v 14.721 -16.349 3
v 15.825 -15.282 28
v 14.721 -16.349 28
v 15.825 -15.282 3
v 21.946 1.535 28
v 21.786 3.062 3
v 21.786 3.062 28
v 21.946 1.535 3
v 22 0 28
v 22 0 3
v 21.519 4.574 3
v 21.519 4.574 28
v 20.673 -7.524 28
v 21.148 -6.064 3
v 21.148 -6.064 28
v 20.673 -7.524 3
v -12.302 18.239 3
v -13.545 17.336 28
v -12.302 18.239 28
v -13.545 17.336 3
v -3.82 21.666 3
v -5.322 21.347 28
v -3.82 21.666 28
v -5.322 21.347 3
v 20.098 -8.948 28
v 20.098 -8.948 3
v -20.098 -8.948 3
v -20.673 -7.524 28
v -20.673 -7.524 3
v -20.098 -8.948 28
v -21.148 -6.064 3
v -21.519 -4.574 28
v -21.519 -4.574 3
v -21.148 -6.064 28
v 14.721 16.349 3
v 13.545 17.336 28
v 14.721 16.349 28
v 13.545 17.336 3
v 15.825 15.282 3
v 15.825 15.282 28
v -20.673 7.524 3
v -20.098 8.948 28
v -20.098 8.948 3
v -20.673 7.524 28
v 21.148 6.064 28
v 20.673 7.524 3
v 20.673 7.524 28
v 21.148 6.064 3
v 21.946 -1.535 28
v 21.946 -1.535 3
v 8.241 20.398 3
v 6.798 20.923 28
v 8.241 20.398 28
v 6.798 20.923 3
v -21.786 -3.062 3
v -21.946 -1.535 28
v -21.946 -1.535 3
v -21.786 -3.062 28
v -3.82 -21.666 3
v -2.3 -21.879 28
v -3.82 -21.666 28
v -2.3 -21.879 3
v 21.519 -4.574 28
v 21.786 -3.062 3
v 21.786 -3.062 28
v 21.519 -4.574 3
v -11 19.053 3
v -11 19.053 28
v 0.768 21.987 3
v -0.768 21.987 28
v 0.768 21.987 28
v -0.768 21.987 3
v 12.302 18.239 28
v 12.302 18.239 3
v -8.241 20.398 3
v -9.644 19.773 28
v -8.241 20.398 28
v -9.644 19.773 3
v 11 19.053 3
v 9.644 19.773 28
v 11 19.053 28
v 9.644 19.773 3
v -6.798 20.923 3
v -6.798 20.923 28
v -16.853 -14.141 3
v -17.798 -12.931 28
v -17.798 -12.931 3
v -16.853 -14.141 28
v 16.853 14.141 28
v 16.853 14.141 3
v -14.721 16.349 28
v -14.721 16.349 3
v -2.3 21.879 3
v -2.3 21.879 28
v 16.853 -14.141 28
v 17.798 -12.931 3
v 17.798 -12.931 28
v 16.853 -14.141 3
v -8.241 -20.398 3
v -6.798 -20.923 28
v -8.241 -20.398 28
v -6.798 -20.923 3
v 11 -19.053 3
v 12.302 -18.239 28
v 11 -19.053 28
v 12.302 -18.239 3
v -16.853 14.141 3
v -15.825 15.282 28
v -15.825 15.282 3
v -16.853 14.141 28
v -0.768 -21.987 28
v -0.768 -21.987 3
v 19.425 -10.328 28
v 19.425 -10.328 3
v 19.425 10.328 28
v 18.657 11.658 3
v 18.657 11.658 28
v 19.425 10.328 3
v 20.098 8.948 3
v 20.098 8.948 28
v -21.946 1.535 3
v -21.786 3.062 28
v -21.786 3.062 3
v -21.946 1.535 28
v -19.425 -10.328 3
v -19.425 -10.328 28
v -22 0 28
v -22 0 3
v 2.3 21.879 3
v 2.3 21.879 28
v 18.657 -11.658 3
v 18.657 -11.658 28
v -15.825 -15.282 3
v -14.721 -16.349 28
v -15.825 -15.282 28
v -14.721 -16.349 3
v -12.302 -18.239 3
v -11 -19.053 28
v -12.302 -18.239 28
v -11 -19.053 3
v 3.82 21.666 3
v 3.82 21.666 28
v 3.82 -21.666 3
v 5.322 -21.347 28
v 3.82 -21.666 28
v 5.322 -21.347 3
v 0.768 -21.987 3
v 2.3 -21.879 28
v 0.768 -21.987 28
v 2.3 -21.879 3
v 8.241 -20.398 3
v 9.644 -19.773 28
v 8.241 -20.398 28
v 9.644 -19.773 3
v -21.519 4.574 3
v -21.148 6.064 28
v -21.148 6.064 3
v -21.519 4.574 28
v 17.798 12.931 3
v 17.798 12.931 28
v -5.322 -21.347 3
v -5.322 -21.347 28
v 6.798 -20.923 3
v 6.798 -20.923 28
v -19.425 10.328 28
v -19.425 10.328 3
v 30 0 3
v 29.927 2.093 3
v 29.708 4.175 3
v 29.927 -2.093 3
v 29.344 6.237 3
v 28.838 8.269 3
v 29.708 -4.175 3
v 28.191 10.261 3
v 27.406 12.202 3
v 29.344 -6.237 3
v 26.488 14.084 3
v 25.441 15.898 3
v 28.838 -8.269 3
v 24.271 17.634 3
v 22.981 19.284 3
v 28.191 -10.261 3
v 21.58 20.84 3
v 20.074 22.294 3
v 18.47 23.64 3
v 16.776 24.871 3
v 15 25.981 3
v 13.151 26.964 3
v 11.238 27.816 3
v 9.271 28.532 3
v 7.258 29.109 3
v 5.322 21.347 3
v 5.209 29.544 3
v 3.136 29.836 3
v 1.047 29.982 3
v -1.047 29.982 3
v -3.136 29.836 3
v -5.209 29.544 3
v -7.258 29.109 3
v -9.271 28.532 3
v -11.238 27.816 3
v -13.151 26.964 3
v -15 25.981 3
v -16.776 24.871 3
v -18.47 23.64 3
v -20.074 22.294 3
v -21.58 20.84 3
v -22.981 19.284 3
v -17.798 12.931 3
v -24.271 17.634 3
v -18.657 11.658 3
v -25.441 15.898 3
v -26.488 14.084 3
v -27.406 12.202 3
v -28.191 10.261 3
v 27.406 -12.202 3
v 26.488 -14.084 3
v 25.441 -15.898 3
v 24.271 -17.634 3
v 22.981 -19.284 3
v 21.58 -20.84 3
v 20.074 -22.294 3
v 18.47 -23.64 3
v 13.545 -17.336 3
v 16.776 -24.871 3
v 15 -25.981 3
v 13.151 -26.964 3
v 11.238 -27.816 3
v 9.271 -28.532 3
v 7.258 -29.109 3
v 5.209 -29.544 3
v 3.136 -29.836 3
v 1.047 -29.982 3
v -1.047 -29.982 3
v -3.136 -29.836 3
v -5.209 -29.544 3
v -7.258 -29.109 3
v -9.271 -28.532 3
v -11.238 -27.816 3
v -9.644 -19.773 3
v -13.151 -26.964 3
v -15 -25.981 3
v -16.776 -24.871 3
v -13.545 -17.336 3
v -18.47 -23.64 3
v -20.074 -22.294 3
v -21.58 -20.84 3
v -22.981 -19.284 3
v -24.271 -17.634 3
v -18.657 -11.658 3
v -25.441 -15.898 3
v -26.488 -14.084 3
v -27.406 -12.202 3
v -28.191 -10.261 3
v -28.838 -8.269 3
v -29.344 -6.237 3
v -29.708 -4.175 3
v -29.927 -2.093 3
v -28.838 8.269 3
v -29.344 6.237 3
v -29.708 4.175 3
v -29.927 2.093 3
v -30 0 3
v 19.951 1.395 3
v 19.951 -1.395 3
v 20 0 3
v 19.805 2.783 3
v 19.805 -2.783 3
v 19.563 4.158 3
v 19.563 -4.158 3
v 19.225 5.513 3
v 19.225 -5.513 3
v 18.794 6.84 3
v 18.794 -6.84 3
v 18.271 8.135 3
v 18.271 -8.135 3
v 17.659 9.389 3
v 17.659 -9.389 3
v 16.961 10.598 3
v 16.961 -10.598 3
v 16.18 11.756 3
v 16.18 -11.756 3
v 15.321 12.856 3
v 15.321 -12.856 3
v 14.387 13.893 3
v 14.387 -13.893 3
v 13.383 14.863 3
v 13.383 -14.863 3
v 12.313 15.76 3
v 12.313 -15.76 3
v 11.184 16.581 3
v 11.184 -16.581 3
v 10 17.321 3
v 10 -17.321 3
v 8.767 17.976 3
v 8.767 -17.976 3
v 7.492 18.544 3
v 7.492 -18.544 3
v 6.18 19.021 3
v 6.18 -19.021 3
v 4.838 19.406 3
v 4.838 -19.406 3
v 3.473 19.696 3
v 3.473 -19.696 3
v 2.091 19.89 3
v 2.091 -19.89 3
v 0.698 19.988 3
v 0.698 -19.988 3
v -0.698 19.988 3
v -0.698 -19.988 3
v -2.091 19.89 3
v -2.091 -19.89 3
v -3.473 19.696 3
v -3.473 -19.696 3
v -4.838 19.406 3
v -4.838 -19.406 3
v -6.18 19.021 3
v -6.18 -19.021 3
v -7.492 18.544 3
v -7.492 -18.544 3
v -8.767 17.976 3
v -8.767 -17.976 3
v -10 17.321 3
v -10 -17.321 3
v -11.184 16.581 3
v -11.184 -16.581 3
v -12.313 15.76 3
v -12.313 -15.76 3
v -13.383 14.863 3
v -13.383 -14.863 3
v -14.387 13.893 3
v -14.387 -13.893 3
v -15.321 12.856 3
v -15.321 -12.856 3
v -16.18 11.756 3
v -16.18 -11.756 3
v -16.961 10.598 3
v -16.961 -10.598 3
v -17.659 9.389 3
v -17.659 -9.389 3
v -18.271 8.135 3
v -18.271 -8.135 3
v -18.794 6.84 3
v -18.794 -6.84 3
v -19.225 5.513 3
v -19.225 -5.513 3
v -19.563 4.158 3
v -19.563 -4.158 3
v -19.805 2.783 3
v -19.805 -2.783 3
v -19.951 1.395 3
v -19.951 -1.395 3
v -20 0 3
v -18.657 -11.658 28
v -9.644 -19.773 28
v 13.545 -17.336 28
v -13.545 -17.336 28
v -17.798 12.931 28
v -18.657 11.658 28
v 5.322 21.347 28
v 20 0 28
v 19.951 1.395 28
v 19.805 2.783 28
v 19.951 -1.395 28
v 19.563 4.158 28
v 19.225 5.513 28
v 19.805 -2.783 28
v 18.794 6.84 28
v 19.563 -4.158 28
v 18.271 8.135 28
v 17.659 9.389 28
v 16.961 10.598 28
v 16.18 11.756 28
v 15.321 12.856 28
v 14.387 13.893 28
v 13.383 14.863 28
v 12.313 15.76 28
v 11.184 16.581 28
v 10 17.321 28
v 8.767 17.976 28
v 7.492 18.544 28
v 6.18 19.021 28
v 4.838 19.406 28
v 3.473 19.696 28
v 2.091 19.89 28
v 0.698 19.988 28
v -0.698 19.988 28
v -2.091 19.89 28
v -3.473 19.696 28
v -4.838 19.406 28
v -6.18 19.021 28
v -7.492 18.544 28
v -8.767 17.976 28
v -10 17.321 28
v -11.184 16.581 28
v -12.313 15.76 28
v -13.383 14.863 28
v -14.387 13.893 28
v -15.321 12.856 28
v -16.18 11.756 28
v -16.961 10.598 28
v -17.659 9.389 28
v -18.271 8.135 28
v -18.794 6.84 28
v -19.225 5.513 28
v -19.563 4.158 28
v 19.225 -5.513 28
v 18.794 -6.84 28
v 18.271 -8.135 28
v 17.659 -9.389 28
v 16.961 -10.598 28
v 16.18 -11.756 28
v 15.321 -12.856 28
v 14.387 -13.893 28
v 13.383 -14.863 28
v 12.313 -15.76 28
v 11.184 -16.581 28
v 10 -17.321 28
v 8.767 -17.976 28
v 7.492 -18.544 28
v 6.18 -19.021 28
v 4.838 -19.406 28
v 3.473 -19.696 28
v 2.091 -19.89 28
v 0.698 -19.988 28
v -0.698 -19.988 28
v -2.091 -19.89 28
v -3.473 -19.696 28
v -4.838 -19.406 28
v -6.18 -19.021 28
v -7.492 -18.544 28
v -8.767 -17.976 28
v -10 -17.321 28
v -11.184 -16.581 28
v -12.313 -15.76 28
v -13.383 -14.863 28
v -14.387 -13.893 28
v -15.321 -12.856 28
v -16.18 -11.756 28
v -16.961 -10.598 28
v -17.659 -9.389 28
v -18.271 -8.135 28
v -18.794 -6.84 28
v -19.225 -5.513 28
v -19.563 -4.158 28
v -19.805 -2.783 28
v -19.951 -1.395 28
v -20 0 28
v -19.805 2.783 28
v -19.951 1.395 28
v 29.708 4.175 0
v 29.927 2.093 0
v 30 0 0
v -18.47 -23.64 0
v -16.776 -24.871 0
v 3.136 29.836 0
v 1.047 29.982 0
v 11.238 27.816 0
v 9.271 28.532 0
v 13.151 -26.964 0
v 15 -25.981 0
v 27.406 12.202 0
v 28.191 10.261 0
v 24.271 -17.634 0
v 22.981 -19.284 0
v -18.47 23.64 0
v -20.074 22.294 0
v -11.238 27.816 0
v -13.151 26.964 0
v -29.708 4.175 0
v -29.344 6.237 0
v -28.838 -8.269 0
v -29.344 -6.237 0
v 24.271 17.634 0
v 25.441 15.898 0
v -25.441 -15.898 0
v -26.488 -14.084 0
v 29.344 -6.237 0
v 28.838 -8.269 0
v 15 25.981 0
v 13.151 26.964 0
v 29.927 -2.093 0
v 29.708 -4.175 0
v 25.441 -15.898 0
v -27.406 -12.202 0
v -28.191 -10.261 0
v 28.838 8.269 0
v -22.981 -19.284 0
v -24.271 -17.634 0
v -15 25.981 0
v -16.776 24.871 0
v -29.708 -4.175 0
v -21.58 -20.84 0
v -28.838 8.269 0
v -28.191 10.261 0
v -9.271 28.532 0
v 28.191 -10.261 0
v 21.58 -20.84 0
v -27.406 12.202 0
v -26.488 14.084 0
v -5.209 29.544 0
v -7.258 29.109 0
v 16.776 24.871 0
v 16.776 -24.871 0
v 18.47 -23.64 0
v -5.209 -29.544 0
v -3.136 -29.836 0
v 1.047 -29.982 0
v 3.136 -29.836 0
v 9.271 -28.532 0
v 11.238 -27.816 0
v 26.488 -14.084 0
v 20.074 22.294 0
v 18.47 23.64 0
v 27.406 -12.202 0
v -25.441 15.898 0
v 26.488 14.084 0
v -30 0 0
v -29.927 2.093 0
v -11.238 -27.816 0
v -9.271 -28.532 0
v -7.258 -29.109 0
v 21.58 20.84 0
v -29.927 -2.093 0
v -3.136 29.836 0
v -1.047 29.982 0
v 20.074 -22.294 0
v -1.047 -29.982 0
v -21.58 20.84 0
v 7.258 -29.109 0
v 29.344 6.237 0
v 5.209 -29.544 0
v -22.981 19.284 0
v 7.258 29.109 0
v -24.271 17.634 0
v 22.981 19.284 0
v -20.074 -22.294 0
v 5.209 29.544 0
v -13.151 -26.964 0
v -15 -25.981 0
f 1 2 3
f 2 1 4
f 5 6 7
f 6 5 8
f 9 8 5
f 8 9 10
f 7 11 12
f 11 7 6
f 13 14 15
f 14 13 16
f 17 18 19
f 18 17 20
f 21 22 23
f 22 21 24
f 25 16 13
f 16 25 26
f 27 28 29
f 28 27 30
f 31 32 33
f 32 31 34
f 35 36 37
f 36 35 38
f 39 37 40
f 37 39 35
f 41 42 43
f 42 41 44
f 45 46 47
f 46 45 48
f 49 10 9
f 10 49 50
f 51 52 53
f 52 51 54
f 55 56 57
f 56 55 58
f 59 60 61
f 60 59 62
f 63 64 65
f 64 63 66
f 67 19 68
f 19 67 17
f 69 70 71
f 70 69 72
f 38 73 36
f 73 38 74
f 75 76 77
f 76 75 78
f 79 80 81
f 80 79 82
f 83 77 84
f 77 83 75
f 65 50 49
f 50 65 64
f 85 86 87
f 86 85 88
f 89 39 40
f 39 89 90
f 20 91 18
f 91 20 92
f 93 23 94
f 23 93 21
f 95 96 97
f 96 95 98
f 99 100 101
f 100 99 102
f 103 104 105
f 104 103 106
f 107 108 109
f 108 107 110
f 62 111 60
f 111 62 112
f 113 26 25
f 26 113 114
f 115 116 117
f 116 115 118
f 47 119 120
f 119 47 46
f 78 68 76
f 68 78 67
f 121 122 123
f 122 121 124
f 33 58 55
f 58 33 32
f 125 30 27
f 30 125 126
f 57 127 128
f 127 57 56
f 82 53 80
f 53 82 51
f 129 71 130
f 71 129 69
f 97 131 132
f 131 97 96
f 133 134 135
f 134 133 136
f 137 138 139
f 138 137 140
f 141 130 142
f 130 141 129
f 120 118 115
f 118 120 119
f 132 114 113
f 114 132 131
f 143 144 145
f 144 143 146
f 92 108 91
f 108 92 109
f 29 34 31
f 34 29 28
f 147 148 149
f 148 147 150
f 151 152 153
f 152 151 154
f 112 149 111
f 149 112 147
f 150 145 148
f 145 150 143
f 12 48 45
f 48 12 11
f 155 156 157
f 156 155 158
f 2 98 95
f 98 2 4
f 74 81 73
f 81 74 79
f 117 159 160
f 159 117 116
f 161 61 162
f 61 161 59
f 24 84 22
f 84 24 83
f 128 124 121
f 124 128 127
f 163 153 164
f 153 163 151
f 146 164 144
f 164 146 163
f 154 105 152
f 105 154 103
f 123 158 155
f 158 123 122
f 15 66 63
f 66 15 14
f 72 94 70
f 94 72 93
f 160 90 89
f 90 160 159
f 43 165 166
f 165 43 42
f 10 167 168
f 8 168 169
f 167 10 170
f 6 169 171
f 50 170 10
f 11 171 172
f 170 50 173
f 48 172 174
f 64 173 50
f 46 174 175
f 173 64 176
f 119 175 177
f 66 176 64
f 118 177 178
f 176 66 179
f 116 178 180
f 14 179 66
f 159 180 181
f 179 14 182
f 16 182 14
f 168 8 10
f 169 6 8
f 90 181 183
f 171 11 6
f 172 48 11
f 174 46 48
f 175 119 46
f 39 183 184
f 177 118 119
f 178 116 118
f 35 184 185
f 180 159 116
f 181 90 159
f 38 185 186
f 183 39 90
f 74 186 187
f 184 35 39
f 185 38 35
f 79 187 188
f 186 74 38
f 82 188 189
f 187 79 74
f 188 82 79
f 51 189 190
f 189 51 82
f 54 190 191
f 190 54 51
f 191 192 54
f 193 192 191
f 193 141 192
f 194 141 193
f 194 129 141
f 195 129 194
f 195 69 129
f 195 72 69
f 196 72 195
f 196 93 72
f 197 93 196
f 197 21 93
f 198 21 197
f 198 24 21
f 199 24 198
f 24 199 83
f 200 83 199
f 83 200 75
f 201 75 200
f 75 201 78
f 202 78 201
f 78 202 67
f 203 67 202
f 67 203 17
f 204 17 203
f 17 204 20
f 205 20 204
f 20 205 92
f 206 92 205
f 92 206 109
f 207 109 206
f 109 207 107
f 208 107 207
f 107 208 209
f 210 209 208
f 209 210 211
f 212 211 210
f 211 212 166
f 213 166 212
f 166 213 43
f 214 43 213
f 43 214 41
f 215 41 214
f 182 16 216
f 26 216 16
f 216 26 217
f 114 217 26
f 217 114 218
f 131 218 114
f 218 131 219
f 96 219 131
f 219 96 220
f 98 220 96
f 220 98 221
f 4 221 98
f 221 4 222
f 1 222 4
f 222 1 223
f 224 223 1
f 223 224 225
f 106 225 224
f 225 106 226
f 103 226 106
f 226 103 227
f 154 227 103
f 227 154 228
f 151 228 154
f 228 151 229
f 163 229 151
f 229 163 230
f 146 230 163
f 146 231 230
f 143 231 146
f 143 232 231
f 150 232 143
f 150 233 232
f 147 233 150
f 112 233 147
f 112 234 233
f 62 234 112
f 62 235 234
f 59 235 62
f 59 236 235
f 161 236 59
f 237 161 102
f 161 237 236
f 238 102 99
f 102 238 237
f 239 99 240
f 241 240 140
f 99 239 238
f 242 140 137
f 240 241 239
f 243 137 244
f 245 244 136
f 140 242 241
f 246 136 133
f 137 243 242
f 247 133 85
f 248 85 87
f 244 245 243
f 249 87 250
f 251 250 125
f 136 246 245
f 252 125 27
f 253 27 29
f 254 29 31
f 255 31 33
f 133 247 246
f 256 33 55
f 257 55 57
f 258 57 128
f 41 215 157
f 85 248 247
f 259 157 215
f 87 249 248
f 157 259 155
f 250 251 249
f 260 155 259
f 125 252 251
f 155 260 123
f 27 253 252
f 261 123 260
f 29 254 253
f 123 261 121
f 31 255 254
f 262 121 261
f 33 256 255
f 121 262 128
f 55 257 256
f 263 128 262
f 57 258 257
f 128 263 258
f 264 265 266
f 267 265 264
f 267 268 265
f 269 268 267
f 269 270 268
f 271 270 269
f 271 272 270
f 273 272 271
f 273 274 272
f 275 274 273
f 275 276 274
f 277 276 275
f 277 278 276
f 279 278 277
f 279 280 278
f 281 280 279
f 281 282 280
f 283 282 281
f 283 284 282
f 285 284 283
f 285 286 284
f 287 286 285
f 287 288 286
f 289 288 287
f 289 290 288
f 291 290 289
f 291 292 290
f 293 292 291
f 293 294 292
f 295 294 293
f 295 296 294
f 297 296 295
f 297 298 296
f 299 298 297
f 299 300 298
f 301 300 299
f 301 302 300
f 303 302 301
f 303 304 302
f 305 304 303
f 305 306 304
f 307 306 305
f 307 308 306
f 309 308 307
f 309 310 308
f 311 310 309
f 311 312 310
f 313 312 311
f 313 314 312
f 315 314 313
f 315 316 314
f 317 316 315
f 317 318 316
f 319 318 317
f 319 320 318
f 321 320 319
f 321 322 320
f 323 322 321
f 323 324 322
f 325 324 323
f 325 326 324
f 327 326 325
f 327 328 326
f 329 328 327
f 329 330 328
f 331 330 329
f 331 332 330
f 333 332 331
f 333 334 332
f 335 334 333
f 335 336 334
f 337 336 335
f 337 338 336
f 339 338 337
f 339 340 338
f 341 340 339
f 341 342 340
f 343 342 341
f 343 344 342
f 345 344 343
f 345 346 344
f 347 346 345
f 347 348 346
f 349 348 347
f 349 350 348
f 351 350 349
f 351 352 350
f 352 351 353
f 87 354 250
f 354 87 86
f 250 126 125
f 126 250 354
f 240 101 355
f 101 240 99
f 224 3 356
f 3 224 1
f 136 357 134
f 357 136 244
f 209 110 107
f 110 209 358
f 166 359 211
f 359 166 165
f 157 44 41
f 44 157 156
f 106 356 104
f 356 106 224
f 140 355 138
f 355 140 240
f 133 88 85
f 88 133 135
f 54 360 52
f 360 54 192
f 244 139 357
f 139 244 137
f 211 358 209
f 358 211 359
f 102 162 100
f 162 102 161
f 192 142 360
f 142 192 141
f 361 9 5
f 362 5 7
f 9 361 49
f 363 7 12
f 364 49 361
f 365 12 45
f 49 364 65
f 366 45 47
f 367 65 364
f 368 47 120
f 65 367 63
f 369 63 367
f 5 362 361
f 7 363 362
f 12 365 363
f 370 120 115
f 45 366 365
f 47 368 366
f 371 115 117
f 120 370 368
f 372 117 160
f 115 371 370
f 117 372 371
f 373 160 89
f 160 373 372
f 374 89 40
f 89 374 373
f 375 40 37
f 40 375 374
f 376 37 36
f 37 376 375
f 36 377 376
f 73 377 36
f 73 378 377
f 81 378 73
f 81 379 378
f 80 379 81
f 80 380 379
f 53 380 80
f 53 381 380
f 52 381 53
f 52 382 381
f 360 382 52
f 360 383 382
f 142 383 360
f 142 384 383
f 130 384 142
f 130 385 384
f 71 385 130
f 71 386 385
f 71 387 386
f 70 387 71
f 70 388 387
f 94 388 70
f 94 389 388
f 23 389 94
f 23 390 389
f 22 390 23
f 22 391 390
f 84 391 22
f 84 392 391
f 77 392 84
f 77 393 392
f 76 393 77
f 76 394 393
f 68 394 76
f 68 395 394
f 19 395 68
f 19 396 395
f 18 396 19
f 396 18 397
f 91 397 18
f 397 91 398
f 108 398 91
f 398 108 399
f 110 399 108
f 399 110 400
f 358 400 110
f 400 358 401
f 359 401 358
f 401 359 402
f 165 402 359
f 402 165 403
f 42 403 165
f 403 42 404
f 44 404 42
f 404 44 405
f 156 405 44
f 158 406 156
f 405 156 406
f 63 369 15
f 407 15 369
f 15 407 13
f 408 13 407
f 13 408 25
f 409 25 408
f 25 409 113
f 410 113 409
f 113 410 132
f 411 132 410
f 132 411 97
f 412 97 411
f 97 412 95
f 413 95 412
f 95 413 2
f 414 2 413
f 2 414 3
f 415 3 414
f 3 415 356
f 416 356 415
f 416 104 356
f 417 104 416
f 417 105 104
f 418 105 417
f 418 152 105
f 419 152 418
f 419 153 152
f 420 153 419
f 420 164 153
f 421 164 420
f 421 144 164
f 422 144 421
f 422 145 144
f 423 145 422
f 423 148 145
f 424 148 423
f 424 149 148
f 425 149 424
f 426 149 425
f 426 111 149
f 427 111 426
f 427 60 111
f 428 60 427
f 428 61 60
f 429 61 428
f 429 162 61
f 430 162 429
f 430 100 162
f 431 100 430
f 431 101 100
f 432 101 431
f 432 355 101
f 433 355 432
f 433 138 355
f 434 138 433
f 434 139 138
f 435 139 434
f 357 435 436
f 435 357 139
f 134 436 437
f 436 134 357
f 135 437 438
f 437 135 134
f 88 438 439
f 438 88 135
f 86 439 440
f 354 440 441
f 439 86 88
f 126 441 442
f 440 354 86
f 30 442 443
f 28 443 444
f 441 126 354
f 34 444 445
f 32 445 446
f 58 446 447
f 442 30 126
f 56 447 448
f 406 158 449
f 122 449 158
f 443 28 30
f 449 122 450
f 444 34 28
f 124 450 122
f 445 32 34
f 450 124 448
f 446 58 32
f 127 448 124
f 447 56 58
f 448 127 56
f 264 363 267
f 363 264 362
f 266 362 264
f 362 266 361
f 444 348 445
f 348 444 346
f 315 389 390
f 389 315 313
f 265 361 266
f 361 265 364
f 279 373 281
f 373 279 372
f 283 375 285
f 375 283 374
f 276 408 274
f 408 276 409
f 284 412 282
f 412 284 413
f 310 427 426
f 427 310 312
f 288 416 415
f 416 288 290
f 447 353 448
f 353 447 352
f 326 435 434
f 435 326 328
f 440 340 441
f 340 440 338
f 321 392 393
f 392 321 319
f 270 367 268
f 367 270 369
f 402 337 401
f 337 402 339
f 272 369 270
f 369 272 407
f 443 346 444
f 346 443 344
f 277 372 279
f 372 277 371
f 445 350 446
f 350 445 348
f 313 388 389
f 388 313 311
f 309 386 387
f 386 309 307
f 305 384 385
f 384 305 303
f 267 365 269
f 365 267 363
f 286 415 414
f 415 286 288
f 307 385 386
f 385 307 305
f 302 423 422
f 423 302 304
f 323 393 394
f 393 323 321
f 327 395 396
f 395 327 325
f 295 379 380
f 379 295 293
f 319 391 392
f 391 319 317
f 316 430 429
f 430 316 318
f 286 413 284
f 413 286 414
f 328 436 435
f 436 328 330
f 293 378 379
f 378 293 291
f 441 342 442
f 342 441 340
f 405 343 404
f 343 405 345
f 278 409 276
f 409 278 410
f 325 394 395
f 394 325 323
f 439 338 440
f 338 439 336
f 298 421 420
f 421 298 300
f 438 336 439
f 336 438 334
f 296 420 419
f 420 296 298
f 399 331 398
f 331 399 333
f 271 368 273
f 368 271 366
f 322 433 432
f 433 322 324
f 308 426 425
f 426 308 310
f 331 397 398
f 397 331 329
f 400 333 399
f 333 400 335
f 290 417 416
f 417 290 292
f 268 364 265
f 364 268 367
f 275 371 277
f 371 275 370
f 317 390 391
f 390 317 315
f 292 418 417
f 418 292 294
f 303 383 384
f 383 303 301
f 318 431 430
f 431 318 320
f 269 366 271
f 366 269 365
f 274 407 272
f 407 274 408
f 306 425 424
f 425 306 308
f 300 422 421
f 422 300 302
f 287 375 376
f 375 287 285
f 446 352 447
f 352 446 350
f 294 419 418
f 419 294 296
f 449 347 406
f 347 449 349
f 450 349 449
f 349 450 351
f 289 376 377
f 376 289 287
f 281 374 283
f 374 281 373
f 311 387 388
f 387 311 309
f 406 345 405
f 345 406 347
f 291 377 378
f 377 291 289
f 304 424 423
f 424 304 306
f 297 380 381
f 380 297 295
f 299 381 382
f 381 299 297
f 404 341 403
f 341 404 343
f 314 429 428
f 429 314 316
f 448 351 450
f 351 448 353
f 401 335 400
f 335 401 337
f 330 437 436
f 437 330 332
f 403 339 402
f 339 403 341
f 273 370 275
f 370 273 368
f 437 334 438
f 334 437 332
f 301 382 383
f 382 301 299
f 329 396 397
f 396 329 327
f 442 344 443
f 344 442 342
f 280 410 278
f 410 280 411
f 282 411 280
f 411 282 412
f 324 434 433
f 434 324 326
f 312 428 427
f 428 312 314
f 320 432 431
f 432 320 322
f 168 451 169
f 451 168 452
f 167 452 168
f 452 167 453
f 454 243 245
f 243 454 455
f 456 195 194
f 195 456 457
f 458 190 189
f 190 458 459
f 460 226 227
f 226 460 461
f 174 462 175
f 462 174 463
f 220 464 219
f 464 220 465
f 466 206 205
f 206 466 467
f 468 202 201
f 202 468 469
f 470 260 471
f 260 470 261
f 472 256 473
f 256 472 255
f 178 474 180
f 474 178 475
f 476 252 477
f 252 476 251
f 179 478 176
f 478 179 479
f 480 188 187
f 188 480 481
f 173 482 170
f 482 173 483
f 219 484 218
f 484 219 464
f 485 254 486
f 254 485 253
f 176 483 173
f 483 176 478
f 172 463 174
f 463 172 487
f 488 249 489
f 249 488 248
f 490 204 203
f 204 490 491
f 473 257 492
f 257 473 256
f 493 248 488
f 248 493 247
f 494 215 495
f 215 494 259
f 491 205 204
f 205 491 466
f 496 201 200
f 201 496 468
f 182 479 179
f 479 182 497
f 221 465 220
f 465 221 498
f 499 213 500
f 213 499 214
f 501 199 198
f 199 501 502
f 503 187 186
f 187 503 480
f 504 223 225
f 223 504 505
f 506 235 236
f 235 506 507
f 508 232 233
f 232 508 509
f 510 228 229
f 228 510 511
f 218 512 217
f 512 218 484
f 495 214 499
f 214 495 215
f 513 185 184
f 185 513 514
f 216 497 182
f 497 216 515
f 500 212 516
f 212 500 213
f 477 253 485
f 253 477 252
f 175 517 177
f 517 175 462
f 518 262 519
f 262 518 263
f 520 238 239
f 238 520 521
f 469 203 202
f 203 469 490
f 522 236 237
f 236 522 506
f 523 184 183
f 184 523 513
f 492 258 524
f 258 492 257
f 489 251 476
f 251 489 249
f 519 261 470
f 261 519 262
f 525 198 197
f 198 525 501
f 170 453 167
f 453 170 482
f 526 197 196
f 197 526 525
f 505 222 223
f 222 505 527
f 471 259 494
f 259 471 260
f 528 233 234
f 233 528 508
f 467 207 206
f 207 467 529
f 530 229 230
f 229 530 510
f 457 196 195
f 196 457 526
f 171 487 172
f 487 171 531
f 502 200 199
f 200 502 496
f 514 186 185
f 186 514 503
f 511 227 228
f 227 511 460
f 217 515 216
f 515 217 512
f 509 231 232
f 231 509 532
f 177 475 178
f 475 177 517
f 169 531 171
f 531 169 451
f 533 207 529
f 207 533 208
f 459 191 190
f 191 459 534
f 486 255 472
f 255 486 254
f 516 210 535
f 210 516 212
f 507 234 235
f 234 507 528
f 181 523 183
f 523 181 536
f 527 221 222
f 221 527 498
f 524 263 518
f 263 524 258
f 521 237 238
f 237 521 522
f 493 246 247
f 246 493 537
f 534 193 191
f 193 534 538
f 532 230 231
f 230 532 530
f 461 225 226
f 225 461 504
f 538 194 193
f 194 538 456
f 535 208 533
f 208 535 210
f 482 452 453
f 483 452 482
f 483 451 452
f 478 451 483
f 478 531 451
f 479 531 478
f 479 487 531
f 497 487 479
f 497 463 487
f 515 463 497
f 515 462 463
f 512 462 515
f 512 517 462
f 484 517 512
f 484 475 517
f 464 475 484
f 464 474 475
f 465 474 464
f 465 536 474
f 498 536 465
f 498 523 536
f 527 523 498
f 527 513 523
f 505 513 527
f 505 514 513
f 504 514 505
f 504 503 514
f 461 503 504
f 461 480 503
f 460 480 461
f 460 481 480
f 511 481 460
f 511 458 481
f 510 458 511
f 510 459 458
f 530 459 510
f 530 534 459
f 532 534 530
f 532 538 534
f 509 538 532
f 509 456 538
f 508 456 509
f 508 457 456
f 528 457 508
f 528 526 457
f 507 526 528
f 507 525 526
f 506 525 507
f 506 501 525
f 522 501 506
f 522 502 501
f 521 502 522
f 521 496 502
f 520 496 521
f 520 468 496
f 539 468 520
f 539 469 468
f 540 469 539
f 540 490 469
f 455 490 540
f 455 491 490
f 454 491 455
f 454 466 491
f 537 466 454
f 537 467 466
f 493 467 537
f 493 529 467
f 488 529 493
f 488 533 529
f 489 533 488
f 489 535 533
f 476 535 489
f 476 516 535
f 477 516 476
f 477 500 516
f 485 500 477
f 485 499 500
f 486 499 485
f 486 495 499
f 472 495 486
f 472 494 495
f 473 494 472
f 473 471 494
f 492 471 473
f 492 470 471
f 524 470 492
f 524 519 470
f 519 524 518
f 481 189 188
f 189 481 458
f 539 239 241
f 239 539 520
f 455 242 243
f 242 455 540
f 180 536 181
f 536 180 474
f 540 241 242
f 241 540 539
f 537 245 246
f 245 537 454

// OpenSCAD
//Simple Plug or Cap

//How thick do you want the solid end portion in mm?
End_Thickness = 3;

//Diameter of the solid end portion in mm (set equal to Tube Outer Diameter for a smooth cap).
End_Diameter = 60;

//Hole diameter in mm (this dimension is critical for a cap).
Tube_Inner_Diameter = 40;

//Outer diameter of the tube portion in mm (this dimension is critical for a plug).
Tube_Outer_Diameter = 44;

//Length of the tube portion in mm (Overall Height = this dimension + End Thickness).
Tube_Height = 25; 

/* [Hidden] */
res = 90;

module plug ()
{
	union()
	{
	cylinder(h = End_Thickness, r = End_Diameter/2, center = false, $fn = res);
	
		difference()
		{
		translate ([0,0,End_Thickness]) cylinder(h = Tube_Height, r = Tube_Outer_Diameter/2, center = false, $fn = res);
		translate ([0,0,End_Thickness]) cylinder(h = Tube_Height+1, r = Tube_Inner_Diameter/2, center = false, $fn = res);
		}
	}
}
plug();
